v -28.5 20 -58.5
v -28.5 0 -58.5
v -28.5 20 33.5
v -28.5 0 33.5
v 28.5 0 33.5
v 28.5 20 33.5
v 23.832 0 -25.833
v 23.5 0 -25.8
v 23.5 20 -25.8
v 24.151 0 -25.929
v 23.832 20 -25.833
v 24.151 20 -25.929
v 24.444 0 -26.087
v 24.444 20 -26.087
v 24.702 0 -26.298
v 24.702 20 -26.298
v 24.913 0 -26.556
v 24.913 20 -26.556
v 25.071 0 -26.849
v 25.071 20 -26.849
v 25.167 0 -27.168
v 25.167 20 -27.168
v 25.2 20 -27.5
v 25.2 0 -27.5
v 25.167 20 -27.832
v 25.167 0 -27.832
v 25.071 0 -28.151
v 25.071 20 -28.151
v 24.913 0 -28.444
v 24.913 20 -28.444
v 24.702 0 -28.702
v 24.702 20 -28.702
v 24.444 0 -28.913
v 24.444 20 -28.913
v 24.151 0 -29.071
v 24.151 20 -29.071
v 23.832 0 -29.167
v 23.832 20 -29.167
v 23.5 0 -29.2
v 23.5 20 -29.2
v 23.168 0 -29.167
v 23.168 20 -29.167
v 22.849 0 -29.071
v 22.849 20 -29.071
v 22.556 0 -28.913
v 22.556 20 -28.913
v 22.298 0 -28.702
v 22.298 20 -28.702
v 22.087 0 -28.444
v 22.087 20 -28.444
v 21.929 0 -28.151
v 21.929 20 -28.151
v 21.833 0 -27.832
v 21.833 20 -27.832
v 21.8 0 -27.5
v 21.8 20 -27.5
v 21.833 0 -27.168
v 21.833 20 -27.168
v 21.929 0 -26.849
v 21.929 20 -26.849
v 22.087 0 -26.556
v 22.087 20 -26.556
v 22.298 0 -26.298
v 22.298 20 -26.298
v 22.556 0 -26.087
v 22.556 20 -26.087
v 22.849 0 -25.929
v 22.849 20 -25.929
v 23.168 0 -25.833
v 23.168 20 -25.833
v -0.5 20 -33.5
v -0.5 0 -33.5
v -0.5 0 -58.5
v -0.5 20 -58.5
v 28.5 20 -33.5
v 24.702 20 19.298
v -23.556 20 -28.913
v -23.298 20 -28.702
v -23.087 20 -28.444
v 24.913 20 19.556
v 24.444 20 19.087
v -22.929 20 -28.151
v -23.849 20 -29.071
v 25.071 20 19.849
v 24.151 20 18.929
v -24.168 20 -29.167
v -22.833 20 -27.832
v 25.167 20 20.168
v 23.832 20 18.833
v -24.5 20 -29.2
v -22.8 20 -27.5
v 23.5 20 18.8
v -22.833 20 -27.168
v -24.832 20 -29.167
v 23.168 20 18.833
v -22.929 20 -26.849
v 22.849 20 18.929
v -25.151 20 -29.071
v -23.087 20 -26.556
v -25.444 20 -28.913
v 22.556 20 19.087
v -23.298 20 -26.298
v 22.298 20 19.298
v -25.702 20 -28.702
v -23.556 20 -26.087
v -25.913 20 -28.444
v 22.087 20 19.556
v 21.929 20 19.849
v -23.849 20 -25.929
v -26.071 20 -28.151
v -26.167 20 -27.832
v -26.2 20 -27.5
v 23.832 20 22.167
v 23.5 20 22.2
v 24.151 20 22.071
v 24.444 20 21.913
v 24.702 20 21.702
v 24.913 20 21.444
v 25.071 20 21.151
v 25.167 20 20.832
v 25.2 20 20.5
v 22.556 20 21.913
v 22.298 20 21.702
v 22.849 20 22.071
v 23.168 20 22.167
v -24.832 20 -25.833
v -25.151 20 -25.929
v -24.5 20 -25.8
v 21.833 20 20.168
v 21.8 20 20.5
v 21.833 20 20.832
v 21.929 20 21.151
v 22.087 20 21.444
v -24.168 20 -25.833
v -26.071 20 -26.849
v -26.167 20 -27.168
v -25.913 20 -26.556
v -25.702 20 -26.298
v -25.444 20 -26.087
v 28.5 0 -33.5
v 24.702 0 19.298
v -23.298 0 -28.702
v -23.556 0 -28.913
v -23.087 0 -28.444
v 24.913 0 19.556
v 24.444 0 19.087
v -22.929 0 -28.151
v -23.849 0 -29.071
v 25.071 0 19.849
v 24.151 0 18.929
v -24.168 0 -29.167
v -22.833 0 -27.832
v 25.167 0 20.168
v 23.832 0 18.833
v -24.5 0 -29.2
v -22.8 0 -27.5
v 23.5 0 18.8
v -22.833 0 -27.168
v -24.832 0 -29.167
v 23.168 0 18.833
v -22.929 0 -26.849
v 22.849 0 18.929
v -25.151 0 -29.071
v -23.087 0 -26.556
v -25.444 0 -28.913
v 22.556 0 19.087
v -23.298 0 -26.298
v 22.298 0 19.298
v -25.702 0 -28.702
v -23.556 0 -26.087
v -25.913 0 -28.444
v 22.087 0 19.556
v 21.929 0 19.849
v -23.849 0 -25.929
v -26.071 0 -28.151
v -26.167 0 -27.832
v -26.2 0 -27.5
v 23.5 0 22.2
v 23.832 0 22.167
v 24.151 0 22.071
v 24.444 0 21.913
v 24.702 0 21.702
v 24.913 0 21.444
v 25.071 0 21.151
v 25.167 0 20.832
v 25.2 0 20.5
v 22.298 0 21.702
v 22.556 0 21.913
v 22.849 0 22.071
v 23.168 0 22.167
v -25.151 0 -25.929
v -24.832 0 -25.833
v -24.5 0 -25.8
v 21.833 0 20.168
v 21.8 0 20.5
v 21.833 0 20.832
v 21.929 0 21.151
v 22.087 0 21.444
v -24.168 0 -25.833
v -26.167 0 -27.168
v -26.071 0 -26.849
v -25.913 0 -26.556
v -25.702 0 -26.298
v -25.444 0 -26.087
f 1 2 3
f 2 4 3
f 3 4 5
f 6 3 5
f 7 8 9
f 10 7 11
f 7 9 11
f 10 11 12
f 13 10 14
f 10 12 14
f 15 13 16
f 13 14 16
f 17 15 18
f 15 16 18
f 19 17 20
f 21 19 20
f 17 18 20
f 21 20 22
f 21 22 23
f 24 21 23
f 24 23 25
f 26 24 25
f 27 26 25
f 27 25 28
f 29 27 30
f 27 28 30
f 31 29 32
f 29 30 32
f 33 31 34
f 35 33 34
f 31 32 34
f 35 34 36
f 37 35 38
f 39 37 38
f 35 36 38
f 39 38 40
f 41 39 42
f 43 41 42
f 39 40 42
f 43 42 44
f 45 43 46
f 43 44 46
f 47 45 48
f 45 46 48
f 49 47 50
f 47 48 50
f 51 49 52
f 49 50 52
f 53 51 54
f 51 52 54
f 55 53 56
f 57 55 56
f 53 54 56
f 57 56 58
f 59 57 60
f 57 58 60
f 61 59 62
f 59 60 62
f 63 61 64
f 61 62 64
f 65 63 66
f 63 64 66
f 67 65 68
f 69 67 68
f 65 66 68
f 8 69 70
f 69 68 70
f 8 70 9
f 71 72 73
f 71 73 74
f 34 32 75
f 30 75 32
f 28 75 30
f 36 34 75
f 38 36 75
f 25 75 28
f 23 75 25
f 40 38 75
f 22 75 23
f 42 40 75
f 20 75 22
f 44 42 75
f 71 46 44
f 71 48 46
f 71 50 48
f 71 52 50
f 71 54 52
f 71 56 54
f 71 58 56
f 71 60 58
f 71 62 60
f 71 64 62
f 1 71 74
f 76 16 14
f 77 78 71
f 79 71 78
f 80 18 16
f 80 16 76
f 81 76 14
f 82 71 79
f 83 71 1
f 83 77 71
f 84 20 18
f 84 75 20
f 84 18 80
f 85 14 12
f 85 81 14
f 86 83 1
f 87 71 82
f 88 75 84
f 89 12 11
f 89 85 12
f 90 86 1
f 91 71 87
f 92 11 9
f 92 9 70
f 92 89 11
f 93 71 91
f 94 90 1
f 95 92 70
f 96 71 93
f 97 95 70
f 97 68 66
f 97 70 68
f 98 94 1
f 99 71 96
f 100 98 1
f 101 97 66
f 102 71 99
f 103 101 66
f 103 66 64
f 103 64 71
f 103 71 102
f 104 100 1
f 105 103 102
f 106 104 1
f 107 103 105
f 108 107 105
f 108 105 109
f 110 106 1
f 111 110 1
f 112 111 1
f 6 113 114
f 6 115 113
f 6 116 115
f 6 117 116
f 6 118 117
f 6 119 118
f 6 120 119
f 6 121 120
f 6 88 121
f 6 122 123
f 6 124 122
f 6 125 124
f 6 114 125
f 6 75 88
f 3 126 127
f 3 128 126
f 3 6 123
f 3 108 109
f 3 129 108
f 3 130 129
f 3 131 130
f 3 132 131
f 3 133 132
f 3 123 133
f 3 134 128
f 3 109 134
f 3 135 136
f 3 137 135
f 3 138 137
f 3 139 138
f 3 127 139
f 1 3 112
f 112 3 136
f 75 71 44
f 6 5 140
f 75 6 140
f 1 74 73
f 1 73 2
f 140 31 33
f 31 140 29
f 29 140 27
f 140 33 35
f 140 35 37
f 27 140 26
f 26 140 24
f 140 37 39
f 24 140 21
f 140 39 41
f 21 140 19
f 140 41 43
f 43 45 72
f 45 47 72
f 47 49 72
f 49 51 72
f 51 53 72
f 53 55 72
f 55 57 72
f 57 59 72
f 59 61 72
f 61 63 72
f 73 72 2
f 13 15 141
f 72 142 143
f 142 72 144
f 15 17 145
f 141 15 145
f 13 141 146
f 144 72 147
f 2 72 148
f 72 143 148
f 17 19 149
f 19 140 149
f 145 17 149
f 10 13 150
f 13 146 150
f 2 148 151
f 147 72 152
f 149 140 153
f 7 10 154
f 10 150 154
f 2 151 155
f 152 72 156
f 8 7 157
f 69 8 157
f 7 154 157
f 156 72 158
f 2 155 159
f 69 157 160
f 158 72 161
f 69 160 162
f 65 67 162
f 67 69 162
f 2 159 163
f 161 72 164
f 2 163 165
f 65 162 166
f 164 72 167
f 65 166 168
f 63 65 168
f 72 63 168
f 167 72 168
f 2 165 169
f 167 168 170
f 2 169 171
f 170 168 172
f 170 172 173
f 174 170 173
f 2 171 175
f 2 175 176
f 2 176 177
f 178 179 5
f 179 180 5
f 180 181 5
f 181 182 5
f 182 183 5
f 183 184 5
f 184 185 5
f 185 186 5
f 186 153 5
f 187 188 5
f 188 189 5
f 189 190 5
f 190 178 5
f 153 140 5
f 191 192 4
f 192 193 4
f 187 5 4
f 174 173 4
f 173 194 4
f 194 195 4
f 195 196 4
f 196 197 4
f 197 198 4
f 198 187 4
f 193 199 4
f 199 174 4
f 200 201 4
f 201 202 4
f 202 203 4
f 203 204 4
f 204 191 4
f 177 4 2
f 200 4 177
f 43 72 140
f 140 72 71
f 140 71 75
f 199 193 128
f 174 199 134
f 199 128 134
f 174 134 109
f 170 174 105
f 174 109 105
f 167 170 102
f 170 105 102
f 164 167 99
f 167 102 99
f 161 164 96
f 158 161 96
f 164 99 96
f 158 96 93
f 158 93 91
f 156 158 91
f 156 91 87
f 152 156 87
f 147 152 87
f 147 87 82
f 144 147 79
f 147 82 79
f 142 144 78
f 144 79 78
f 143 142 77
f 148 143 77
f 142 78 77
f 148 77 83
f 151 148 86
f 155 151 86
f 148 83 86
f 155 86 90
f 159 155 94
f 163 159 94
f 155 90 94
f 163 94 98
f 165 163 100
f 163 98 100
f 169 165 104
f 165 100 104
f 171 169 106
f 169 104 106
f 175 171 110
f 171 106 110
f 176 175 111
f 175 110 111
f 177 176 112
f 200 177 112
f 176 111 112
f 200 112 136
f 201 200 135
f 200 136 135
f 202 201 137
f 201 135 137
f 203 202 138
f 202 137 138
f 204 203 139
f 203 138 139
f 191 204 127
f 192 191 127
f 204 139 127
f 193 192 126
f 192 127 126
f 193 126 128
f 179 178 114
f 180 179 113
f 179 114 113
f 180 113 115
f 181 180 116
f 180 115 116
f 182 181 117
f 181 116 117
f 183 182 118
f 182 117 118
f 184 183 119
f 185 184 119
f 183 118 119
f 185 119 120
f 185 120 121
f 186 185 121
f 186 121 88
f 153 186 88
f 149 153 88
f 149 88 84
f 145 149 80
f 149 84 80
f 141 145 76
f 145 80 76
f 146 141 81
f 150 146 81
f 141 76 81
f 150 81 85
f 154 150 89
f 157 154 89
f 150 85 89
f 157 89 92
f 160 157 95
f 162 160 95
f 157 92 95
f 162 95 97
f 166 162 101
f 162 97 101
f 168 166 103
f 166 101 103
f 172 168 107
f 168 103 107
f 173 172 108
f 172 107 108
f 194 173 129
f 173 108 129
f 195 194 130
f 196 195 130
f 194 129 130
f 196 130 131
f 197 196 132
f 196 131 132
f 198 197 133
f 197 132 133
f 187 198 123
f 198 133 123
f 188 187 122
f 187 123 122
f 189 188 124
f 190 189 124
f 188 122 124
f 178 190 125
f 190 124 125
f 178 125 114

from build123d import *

# Parameters (mm, degrees)
SKETCH1_W           = 57
SKETCH1_H           = 67
BOSS_EXTRUDE1_DEPTH = 20
SKETCH2_R           = 1.7
CUT_EXTRUDE1_DEPTH  = 20
SKETCH3_W           = 28
SKETCH3_H           = 20
BOSS_EXTRUDE2_DEPTH = 25


with BuildPart() as part:
    # Sketch1 → Boss-Extrude1 (new body)
    with BuildSketch(Plane(origin=(0, 0, 0), x_dir=(1, 0, 0), z_dir=(0, 1, 0))):
        Rectangle(SKETCH1_W, SKETCH1_H)
    extrude(amount=BOSS_EXTRUDE1_DEPTH)

    # Sketch2 → Cut-Extrude1 (cut)
    with BuildSketch(Plane(origin=(0, 20, 0), x_dir=(1, 0, 0), z_dir=(0, 1, 0))):
        with Locations(Location((-24.5, 27.5, 0), (0, 0, 270))):
            Circle(SKETCH2_R)
        with Locations(Location((23.5, 27.5, 0), (0, 0, 270))):
            Circle(SKETCH2_R)
        with Locations(Location((23.5, -20.5, 0), (0, 0, 270))):
            Circle(SKETCH2_R)
    extrude(amount=-CUT_EXTRUDE1_DEPTH, mode=Mode.SUBTRACT)

    # Sketch3 → Boss-Extrude2 (add)
    with BuildSketch(Plane(origin=(0, 0, -33.5), x_dir=(-1, 0, 0), z_dir=(0, 0, -1))):
        with Locations((14.5, 10)):
            Rectangle(SKETCH3_W, SKETCH3_H)
    extrude(amount=BOSS_EXTRUDE2_DEPTH)


solid = part.part
